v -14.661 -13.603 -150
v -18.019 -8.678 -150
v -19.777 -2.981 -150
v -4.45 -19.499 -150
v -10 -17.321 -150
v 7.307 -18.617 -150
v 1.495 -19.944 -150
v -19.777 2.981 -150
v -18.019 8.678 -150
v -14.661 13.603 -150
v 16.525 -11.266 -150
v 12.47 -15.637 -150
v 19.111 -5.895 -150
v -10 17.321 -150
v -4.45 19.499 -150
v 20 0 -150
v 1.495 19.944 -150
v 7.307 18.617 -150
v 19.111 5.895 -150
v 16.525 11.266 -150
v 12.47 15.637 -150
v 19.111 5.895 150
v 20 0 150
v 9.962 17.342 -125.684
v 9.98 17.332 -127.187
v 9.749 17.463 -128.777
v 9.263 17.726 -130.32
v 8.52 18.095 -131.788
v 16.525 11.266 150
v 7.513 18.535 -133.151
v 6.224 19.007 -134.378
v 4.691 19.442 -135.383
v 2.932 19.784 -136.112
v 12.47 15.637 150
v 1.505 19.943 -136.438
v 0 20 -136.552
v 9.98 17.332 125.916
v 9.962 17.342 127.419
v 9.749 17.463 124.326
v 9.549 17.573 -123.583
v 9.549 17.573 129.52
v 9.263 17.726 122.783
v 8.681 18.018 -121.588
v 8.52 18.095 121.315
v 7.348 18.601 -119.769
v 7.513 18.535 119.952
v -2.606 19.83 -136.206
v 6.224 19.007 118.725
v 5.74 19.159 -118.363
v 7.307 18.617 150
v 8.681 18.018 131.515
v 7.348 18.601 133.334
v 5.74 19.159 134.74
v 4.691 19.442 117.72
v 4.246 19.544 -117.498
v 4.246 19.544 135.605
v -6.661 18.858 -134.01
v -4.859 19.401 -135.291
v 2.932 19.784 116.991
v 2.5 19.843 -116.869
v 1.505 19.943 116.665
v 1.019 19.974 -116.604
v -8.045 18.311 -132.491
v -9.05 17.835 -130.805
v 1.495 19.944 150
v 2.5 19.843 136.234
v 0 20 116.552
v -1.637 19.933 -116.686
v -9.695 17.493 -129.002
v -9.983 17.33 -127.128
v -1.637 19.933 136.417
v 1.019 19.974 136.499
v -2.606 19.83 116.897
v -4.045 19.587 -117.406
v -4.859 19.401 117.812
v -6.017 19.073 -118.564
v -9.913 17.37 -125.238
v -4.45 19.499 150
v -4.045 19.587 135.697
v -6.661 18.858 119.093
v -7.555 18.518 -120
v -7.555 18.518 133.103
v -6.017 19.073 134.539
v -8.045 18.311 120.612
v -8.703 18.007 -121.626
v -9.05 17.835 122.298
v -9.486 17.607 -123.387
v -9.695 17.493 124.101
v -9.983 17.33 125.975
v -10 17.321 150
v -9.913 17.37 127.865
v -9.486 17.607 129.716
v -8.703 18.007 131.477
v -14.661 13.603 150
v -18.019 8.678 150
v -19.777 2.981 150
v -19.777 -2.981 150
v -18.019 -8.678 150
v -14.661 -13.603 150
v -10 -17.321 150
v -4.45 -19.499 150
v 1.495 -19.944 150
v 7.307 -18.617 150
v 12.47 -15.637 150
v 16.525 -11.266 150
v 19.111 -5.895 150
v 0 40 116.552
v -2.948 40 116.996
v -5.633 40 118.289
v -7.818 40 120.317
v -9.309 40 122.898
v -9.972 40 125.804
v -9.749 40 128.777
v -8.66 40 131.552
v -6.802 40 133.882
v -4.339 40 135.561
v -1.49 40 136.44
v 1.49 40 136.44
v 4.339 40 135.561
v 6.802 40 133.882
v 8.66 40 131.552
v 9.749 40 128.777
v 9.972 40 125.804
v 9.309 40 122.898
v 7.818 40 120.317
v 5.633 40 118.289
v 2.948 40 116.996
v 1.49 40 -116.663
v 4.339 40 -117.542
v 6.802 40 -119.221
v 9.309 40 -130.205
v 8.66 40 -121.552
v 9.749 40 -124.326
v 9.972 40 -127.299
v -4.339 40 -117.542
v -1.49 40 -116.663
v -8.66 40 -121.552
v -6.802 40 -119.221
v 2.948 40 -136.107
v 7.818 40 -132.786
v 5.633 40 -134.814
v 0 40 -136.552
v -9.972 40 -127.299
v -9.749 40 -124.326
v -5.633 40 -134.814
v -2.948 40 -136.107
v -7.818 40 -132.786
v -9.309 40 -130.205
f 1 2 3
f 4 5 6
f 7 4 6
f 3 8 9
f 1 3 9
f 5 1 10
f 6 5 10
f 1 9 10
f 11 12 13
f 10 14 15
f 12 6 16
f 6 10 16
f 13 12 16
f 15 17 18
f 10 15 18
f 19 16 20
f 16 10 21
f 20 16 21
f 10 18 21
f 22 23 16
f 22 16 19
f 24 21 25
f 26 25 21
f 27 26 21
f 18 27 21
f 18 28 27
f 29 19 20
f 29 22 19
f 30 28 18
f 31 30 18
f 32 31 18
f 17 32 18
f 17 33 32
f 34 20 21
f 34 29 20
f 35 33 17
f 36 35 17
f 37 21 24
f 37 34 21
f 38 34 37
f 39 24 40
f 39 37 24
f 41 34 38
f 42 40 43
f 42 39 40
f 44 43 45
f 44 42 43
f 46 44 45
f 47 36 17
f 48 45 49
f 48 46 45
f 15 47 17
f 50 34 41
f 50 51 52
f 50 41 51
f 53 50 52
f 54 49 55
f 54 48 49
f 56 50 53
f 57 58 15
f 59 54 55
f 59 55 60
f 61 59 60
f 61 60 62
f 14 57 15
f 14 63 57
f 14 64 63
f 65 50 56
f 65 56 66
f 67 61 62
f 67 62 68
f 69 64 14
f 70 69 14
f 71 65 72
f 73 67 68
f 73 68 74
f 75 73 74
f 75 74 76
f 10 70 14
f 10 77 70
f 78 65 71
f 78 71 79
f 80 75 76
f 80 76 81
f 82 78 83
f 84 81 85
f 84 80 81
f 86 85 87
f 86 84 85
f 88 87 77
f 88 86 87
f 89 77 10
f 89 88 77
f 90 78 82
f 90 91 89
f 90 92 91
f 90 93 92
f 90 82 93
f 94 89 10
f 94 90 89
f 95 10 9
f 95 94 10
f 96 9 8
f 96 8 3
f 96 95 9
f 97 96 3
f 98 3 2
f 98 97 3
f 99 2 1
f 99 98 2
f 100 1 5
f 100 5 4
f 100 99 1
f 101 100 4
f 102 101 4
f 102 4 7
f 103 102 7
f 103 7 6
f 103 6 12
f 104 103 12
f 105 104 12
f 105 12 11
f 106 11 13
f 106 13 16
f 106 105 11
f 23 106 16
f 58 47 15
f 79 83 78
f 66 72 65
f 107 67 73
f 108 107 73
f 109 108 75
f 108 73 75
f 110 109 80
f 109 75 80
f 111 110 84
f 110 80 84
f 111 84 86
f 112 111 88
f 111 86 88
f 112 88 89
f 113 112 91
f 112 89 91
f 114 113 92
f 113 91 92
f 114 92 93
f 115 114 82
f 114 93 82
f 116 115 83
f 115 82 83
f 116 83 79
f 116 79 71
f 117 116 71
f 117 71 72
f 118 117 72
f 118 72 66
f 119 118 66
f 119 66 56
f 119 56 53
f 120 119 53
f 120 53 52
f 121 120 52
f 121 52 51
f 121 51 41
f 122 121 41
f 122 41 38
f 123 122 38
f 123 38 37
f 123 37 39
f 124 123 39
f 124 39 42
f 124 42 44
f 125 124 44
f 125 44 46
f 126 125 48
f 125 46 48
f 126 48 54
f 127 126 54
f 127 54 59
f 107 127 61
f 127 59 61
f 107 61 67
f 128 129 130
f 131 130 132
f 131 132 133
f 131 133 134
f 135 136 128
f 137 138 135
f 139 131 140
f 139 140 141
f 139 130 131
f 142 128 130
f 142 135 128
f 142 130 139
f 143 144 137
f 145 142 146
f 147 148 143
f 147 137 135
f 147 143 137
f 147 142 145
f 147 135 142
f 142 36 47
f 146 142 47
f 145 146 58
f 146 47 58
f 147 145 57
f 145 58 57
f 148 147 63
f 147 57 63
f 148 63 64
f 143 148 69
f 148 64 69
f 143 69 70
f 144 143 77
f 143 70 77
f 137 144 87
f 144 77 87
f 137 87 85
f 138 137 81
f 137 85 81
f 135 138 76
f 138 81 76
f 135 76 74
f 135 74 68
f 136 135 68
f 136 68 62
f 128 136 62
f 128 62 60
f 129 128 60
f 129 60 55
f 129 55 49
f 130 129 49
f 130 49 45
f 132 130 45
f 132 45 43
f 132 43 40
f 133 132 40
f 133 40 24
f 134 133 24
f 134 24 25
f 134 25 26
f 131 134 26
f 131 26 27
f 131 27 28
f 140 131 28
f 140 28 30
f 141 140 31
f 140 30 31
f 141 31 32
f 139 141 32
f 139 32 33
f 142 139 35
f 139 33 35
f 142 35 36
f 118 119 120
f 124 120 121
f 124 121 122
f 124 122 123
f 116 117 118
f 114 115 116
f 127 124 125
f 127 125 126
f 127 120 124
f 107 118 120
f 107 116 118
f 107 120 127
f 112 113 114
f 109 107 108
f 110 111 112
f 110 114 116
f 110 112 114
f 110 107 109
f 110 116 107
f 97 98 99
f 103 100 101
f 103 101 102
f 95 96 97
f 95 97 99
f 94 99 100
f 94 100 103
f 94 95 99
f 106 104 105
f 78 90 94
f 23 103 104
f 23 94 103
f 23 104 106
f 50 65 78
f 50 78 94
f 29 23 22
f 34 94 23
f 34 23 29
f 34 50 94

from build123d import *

# Parameters (mm, degrees)
SKETCH_1_R      = 20
EXTRUDE_1_DEPTH = 150
SKETCH_3_R      = 10
EXTRUDE_2_DEPTH = 40


with BuildPart() as part:
    # 草图1 → 凸台-拉伸1 (new, symmetric)
    with BuildSketch(Plane.XY):
        Circle(SKETCH_1_R)
    extrude(amount=EXTRUDE_1_DEPTH, both=True)

    # 草图3 → 凸台-拉伸2 (add)
    with BuildSketch(Plane(origin=(0, 0, 0), x_dir=(1, 0, 0), z_dir=(0, 1, 0))):
        with Locations(Location((0, 126.551526586, 0), (0, 0, 90))):
            Circle(SKETCH_3_R)
        with Locations(Location((0, -126.551526586, 0), (0, 0, 90))):
            Circle(SKETCH_3_R)
    extrude(amount=EXTRUDE_2_DEPTH)


solid = part.part
